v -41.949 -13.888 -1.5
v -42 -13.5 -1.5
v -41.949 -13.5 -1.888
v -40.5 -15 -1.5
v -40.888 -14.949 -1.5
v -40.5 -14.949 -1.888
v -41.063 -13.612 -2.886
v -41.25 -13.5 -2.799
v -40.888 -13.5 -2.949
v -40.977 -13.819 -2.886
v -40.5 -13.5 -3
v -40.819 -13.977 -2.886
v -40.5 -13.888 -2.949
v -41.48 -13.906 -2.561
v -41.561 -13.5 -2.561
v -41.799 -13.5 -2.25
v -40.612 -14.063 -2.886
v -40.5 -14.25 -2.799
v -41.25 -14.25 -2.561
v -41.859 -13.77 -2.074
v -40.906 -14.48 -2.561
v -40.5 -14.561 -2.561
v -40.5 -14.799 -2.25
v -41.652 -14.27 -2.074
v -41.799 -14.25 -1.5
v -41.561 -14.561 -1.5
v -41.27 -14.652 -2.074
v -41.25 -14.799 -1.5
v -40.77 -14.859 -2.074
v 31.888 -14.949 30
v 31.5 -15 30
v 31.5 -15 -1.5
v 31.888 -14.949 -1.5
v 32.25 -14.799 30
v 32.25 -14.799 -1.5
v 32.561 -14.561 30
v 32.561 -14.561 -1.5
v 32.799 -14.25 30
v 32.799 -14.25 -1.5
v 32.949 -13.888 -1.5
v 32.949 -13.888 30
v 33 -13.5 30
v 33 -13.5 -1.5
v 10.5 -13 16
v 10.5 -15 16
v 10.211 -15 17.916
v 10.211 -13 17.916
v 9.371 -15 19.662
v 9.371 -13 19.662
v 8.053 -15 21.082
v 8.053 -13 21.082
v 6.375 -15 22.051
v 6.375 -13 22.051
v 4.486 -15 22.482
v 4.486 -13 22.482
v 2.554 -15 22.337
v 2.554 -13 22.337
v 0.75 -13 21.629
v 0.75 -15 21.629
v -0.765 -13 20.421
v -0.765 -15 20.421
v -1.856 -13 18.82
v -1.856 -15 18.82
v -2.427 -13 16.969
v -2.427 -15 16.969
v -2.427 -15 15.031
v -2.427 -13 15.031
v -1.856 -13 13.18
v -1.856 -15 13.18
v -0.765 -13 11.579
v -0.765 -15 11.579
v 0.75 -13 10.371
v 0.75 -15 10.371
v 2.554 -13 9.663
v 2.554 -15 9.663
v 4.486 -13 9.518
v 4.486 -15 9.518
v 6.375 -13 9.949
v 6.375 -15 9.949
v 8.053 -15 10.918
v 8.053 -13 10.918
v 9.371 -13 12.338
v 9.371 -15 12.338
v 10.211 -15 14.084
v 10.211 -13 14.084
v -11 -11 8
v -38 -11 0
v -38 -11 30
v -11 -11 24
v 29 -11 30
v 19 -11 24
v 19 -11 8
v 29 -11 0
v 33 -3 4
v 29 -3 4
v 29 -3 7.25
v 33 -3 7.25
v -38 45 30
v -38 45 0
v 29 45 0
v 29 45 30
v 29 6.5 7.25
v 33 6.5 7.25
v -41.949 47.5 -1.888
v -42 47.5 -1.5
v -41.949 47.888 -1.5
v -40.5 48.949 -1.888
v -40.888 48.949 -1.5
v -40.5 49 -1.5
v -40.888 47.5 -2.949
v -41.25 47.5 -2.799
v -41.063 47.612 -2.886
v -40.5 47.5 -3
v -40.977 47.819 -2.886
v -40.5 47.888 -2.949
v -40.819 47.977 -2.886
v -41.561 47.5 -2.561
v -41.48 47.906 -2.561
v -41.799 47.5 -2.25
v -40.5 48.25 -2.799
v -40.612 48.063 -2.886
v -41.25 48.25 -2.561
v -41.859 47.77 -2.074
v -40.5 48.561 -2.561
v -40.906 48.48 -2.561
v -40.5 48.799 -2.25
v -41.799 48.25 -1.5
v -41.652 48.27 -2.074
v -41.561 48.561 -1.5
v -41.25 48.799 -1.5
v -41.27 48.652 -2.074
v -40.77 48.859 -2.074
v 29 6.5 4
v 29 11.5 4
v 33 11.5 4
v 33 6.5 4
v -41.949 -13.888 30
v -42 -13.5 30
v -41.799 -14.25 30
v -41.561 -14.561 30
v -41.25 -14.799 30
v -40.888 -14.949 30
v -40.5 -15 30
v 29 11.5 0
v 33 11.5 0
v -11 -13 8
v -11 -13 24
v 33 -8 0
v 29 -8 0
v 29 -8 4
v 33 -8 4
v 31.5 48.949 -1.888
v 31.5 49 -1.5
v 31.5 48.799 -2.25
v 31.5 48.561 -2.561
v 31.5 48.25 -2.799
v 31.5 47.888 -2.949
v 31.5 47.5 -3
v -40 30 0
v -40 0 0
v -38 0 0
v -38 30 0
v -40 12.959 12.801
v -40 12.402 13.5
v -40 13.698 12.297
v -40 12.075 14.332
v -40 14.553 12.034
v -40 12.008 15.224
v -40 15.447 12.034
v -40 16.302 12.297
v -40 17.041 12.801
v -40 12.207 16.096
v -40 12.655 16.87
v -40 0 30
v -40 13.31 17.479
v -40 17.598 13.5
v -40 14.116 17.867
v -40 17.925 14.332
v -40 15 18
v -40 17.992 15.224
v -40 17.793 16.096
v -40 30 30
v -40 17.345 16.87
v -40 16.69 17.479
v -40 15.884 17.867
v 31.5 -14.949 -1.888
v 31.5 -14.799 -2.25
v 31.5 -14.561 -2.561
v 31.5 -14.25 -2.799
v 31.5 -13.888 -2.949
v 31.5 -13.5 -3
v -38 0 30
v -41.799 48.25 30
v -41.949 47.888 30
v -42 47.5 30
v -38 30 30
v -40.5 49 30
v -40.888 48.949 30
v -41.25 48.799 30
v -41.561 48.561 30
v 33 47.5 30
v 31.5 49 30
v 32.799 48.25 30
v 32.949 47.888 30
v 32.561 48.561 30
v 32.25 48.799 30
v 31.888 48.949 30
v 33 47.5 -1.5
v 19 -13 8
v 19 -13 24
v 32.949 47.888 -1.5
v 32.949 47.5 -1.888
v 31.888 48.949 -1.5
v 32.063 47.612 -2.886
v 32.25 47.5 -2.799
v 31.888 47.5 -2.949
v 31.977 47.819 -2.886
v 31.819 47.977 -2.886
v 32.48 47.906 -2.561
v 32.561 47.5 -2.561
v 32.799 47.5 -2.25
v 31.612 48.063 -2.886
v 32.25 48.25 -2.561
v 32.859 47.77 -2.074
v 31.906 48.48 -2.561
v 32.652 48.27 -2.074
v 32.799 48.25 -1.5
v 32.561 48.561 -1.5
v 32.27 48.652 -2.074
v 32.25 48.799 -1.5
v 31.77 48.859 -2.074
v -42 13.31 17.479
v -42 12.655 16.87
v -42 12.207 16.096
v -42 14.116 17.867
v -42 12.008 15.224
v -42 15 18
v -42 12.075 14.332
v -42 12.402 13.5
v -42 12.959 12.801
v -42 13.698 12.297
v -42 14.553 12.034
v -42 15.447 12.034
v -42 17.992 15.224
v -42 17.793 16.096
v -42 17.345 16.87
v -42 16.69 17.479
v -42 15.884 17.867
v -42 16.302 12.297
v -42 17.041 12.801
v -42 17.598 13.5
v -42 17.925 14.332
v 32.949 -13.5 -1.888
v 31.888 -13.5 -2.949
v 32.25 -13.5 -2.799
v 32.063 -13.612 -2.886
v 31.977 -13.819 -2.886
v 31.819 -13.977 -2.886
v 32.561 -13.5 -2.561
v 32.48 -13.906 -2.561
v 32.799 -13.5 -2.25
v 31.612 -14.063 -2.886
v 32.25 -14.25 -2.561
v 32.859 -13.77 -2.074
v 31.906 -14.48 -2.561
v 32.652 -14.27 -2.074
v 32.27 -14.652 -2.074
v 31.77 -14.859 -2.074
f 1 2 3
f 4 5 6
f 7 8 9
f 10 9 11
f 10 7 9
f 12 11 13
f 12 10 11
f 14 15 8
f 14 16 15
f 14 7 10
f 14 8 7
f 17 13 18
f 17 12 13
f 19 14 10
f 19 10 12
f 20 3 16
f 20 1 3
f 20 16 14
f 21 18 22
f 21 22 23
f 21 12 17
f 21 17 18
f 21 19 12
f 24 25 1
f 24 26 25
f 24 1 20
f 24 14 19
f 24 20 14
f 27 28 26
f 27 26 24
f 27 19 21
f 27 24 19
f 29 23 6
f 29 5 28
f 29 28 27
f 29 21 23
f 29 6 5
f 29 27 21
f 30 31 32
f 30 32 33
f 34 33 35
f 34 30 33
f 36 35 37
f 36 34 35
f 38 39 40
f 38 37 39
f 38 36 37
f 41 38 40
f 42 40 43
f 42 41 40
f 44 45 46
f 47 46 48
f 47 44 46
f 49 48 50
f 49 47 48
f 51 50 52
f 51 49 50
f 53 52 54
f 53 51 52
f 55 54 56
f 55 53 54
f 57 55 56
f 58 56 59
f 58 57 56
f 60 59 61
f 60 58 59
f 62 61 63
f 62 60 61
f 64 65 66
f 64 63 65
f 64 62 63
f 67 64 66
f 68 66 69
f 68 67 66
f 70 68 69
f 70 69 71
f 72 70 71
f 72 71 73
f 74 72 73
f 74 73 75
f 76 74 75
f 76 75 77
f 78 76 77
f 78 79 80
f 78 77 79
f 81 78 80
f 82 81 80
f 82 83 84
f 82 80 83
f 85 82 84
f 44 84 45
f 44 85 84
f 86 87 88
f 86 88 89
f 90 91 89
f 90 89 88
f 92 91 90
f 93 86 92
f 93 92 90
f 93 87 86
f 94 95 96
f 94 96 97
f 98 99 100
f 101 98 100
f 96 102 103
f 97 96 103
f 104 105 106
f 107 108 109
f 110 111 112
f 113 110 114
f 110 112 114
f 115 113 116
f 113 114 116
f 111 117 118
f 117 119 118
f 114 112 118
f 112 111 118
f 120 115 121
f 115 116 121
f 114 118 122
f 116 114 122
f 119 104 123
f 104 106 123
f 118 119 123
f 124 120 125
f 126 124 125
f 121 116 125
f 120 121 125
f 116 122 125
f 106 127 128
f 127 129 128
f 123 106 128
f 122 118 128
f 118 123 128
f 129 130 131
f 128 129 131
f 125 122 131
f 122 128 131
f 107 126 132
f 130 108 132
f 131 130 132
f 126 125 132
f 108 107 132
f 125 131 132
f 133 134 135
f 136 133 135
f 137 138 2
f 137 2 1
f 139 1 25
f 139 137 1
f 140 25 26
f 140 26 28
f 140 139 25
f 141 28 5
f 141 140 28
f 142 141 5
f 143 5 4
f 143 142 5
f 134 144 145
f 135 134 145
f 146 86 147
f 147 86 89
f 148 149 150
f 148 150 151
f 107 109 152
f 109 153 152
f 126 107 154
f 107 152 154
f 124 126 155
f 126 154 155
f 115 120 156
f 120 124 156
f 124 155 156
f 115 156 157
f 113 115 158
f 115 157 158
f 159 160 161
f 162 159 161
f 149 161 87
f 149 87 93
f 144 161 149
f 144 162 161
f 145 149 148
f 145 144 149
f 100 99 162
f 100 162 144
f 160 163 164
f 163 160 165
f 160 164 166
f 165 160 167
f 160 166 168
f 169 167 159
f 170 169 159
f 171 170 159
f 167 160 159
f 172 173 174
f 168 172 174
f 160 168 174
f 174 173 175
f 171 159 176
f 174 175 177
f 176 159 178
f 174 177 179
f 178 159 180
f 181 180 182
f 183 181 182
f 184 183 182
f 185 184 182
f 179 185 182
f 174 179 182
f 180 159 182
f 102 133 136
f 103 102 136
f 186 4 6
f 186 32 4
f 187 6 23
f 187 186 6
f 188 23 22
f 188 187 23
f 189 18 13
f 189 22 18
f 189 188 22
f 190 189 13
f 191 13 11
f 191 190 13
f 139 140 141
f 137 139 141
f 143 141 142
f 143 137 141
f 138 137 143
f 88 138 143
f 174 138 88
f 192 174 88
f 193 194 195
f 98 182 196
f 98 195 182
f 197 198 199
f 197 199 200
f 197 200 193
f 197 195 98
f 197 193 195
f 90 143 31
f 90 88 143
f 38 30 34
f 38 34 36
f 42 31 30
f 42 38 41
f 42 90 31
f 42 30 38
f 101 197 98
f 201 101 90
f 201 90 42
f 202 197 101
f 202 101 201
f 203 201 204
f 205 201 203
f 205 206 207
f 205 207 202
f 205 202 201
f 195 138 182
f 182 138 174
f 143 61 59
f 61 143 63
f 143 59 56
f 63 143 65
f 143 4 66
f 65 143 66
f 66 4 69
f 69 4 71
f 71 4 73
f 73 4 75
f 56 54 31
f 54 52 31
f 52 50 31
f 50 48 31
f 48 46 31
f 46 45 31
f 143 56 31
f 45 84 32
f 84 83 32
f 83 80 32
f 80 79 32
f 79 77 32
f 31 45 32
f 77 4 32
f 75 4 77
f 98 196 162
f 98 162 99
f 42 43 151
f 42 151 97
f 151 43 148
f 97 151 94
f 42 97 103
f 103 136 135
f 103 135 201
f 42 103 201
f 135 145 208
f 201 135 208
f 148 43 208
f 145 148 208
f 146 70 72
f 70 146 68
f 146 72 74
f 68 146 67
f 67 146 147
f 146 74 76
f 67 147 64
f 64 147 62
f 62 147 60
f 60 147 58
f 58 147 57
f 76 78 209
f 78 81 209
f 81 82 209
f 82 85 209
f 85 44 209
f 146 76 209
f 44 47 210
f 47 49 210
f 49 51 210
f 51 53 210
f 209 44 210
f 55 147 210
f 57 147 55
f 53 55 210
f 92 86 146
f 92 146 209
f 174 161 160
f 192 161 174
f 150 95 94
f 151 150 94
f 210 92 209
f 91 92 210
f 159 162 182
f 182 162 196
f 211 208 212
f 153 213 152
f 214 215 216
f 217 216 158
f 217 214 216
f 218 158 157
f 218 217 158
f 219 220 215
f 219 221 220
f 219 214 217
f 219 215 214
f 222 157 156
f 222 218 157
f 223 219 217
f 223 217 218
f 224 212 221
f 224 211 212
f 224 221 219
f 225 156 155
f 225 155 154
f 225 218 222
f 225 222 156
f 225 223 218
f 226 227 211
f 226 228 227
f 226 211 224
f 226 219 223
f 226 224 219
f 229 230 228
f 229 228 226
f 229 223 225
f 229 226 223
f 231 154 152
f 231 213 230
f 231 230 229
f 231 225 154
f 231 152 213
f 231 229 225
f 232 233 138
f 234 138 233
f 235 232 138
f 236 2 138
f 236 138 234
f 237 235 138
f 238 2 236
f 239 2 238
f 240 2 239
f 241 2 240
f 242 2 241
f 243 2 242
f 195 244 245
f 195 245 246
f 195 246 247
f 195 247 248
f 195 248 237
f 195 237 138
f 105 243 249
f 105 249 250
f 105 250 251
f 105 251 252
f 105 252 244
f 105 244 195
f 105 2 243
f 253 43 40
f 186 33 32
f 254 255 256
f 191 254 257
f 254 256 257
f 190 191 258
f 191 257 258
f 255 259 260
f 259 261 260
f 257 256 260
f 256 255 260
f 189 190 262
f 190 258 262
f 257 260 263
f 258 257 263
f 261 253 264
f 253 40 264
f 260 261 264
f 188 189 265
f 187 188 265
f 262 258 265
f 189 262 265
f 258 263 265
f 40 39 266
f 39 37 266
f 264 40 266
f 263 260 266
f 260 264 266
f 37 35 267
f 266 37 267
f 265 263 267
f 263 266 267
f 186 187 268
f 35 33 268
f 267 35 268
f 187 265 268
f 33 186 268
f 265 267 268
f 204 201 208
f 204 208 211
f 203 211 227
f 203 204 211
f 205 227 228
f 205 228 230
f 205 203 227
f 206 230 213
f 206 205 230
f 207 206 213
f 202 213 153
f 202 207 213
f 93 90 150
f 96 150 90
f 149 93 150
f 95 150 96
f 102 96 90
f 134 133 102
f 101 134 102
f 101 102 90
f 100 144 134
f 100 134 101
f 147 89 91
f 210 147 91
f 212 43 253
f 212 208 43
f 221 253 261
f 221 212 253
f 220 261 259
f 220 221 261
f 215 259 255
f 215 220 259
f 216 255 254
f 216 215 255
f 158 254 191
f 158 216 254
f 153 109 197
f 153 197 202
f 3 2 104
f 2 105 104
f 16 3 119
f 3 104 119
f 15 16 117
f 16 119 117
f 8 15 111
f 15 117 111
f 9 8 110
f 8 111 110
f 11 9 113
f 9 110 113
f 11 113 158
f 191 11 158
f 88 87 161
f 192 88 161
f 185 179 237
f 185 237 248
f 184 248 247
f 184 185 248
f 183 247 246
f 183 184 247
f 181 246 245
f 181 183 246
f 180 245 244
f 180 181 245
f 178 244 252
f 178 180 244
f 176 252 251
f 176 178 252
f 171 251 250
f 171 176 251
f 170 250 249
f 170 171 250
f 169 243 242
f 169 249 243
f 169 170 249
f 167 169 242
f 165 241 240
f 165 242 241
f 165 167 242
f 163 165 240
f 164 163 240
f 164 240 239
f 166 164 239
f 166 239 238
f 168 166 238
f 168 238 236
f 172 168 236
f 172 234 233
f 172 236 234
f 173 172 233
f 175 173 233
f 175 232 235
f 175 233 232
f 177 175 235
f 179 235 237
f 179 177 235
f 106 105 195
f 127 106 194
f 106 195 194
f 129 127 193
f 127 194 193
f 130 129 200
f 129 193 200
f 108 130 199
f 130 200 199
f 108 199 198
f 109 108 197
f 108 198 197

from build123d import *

# Parameters (mm, degrees)
CYLINDER005_R             = 3
CYLINDER005_DEPTH         = 10
BOX009_W                  = 30
BOX009_H                  = 30
BOX009_DEPTH              = 6
FUSION005_PLACEMENT_ANGLE = 270
BOX008_W                  = 28
BOX008_H                  = 18
BOX008_DEPTH              = 12.2
BOX007_W                  = 10
BOX007_H                  = 10
BOX007_DEPTH              = 10
BOX006_W                  = 10
BOX006_H                  = 10
BOX006_DEPTH              = 10
BOX005_W                  = 10
BOX005_H                  = 8
BOX005_DEPTH              = 4
BOX004_W                  = 29
BOX004_H                  = 19.5
BOX004_DEPTH              = 7.25
CYLINDER004_R             = 3.6
CYLINDER004_DEPTH         = 6.7
CYLINDER003_R             = 4.65
CYLINDER003_DEPTH         = 19
CYLINDER002_R             = 3.6
CYLINDER002_DEPTH         = 6.7
CYLINDER001_R             = 4.65
CYLINDER001_DEPTH         = 19
BOX003_W                  = 50
BOX003_H                  = 27
BOX003_DEPTH              = 12
BOX002_W                  = 51
BOX002_H                  = 24
BOX002_DEPTH              = 7
BOX001_W                  = 51
BOX001_H                  = 28
BOX001_DEPTH              = 6
FUSION001_PLACEMENT_ANGLE = 90
CYLINDER_R                = 6.5
CYLINDER_DEPTH            = 9
BOX_W                     = 30
BOX_H                     = 16
BOX_DEPTH                 = 30
FUSION_PLACEMENT_ANGLE    = 90
BOX013_W                  = 27
BOX013_H                  = 15.5
BOX013_DEPTH              = 3.5
BOX012_W                  = 75
BOX012_H                  = 64
BOX012_DEPTH              = 4
BOX011_W                  = 67
BOX011_H                  = 56
BOX011_DEPTH              = 30
BOX010_W                  = 75
BOX010_H                  = 64
BOX010_DEPTH              = 36
FILLET_R                  = 1.5


with BuildPart() as cylinder005:
    # Cylinder005 → Cylinder005 (new body)
    with BuildSketch(Plane(origin=(15, 15, 0), x_dir=(1, 0, 0), z_dir=(0, 0, 1))):
        Circle(CYLINDER005_R)
    extrude(amount=CYLINDER005_DEPTH)


with BuildPart() as piezo_buzzer:
    # Box009 → Box009 (new body)
    with BuildSketch(Plane.XY):
        with Locations((15, 15)):
            Rectangle(BOX009_W, BOX009_H)
    extrude(amount=BOX009_DEPTH)

    # Fusion005: union Cylinder005
    add(cylinder005.part)


with BuildPart() as piezo_buzzer_1:
    # Fusion005 placement: moved
    add(piezo_buzzer.part.moved(Location((-34, 0, 0))).rotate(Axis((-34, 0, 0), (0, 1, 0)), FUSION005_PLACEMENT_ANGLE))


with BuildPart() as piezo_driver:
    # Box008 → Box008 (new body)
    with BuildSketch(Plane(origin=(-30, -7, 0), x_dir=(1, 0, 0), z_dir=(0, 0, 1))):
        with Locations((14, 9)):
            Rectangle(BOX008_W, BOX008_H)
    extrude(amount=BOX008_DEPTH)


with BuildPart() as cube006:
    # Box007 → Box007 (new body)
    with BuildSketch(Plane(origin=(19, 14.5, 4), x_dir=(1, 0, 0), z_dir=(0, 0, 1))):
        with Locations((5, 5)):
            Rectangle(BOX007_W, BOX007_H)
    extrude(amount=BOX007_DEPTH)


with BuildPart() as cube005:
    # Box006 → Box006 (new body)
    with BuildSketch(Plane(origin=(19, -5, 4), x_dir=(1, 0, 0), z_dir=(0, 0, 1))):
        with Locations((5, 5)):
            Rectangle(BOX006_W, BOX006_H)
    extrude(amount=BOX006_DEPTH)


with BuildPart() as cube004:
    # Box005 → Box005 (new body)
    with BuildSketch(Plane(origin=(28, 5.75, 1.75), x_dir=(1, 0, 0), z_dir=(0, 0, 1))):
        with Locations((5, 4)):
            Rectangle(BOX005_W, BOX005_H)
    extrude(amount=BOX005_DEPTH)


with BuildPart() as usb_battery_charger:
    # Box004 → Box004 (new body)
    with BuildSketch(Plane.XY):
        with Locations((14.5, 9.75)):
            Rectangle(BOX004_W, BOX004_H)
    extrude(amount=BOX004_DEPTH)

    # Fusion004: union Cube004
    add(cube004.part)

    # Cut: cut Cube005
    add(cube005.part, mode=Mode.SUBTRACT)

    # Cut001: cut Cube006
    add(cube006.part, mode=Mode.SUBTRACT)


with BuildPart() as usb_battery_charger_1:
    # Cut001 placement: moved
    add(usb_battery_charger.part.moved(Location((4, -8, 0))))


with BuildPart() as cylinder004:
    # Cylinder004 → Cylinder004 (new body)
    with BuildSketch(Plane.XY.offset(19)):
        Circle(CYLINDER004_R)
    extrude(amount=CYLINDER004_DEPTH)


with BuildPart() as push_button_start_stop:
    # Cylinder003 → Cylinder003 (new body)
    with BuildSketch(Plane.XY):
        Circle(CYLINDER003_R)
    extrude(amount=CYLINDER003_DEPTH)

    # Fusion003: union Cylinder004
    add(cylinder004.part)


with BuildPart() as push_button_start_stop_1:
    # Fusion003 placement: moved
    add(push_button_start_stop.part.moved(Location((3, 35, 12))))


with BuildPart() as cylinder002:
    # Cylinder002 → Cylinder002 (new body)
    with BuildSketch(Plane.XY.offset(19)):
        Circle(CYLINDER002_R)
    extrude(amount=CYLINDER002_DEPTH)


with BuildPart() as push_button_mode_reset:
    # Cylinder001 → Cylinder001 (new body)
    with BuildSketch(Plane.XY):
        Circle(CYLINDER001_R)
    extrude(amount=CYLINDER001_DEPTH)

    # Fusion002: union Cylinder002
    add(cylinder002.part)


with BuildPart() as push_button_mode_reset_1:
    # Fusion002 placement: moved
    add(push_button_mode_reset.part.moved(Location((20, 35, 12))))


with BuildPart() as lipo_battery:
    # Box003 → Box003 (new body)
    with BuildSketch(Plane(origin=(-22, 18, 0), x_dir=(1, 0, 0), z_dir=(0, 0, 1))):
        with Locations((25, 13.5)):
            Rectangle(BOX003_W, BOX003_H)
    extrude(amount=BOX003_DEPTH)


with BuildPart() as cube002:
    # Box002 → Box002 (new body)
    with BuildSketch(Plane(origin=(0, 2, 6), x_dir=(1, 0, 0), z_dir=(0, 0, 1))):
        with Locations((25.5, 12)):
            Rectangle(BOX002_W, BOX002_H)
    extrude(amount=BOX002_DEPTH)


with BuildPart() as lcd_display:
    # Box001 → Box001 (new body)
    with BuildSketch(Plane.XY):
        with Locations((25.5, 14)):
            Rectangle(BOX001_W, BOX001_H)
    extrude(amount=BOX001_DEPTH)

    # Fusion001: union Cube002
    add(cube002.part)


with BuildPart() as lcd_display_1:
    # Fusion001 placement: moved
    add(lcd_display.part.moved(Location((-5, -8, 25))).rotate(Axis((-5, -8, 25), (0, 0, 1)), FUSION001_PLACEMENT_ANGLE))


with BuildPart() as cylinder:
    # Cylinder → Cylinder (new body)
    with BuildSketch(Plane(origin=(15, 8, 30), x_dir=(1, 0, 0), z_dir=(0, 0, 1))):
        Circle(CYLINDER_R)
    extrude(amount=CYLINDER_DEPTH)


with BuildPart() as awesome_switch:
    # Box → Box (new body)
    with BuildSketch(Plane.XY):
        with Locations((15, 8)):
            Rectangle(BOX_W, BOX_H)
    extrude(amount=BOX_DEPTH)

    # Fusion: union Cylinder
    add(cylinder.part)


with BuildPart() as awesome_switch_1:
    # Fusion placement: moved
    add(awesome_switch.part.moved(Location((-11, 17, 8))).rotate(Axis((-11, 17, 8), (1, 0, 0)), FUSION_PLACEMENT_ANGLE))


with BuildPart() as parts:
    # Box013 → Box013 (new body)
    with BuildSketch(Plane(origin=(-35, 19, 12), x_dir=(1, 0, 0), z_dir=(0, 0, 1))):
        with Locations((13.5, 7.75)):
            Rectangle(BOX013_W, BOX013_H)
    extrude(amount=BOX013_DEPTH)

    # Fusion006: union Piezo Buzzer, Piezo Driver, USB Battery Charger, Push Button start/stop, Push Button mode/reset, Lipo Battery, LCD Display, Awesome switch
    add(piezo_buzzer_1.part)
    add(piezo_driver.part)
    add(usb_battery_charger_1.part)
    add(push_button_start_stop_1.part)
    add(push_button_mode_reset_1.part)
    add(lipo_battery.part)
    add(lcd_display_1.part)
    add(awesome_switch_1.part)


with BuildPart() as lidremove:
    # Box012 → Box012 (new body)
    with BuildSketch(Plane(origin=(-42, -15, 30), x_dir=(1, 0, 0), z_dir=(0, 0, 1))):
        with Locations((37.5, 32)):
            Rectangle(BOX012_W, BOX012_H)
    extrude(amount=BOX012_DEPTH)


with BuildPart() as innerbox:
    # Box011 → Box011 (new body)
    with BuildSketch(Plane(origin=(-38, -11, 0), x_dir=(1, 0, 0), z_dir=(0, 0, 1))):
        with Locations((33.5, 28)):
            Rectangle(BOX011_W, BOX011_H)
    extrude(amount=BOX011_DEPTH)


with BuildPart() as cut004:
    # Box010 → Box010 (new body)
    with BuildSketch(Plane(origin=(-42, -15, -3), x_dir=(1, 0, 0), z_dir=(0, 0, 1))):
        with Locations((37.5, 32)):
            Rectangle(BOX010_W, BOX010_H)
    extrude(amount=BOX010_DEPTH)

    # Fillet
    fillet_edges = [cut004.edges().sort_by_distance(p)[0] for p in [
        (-42, -15, 15),
        (-42, 17, 33),
        (-42, 49, 15),
        (-42, 17, -3),
        (33, -15, 15),
        (33, 17, 33),
        (33, 49, 15),
        (33, 17, -3),
        (-4.5, -15, -3),
        (-4.5, -15, 33),
        (-4.5, 49, -3),
        (-4.5, 49, 33),
    ]]
    fillet(fillet_edges, radius=FILLET_R)

    # Cut002: cut InnerBox
    add(innerbox.part, mode=Mode.SUBTRACT)

    # Cut003: cut LidRemove
    add(lidremove.part, mode=Mode.SUBTRACT)

    # Cut004: cut parts
    add(parts.part, mode=Mode.SUBTRACT)


solid = cut004.part
